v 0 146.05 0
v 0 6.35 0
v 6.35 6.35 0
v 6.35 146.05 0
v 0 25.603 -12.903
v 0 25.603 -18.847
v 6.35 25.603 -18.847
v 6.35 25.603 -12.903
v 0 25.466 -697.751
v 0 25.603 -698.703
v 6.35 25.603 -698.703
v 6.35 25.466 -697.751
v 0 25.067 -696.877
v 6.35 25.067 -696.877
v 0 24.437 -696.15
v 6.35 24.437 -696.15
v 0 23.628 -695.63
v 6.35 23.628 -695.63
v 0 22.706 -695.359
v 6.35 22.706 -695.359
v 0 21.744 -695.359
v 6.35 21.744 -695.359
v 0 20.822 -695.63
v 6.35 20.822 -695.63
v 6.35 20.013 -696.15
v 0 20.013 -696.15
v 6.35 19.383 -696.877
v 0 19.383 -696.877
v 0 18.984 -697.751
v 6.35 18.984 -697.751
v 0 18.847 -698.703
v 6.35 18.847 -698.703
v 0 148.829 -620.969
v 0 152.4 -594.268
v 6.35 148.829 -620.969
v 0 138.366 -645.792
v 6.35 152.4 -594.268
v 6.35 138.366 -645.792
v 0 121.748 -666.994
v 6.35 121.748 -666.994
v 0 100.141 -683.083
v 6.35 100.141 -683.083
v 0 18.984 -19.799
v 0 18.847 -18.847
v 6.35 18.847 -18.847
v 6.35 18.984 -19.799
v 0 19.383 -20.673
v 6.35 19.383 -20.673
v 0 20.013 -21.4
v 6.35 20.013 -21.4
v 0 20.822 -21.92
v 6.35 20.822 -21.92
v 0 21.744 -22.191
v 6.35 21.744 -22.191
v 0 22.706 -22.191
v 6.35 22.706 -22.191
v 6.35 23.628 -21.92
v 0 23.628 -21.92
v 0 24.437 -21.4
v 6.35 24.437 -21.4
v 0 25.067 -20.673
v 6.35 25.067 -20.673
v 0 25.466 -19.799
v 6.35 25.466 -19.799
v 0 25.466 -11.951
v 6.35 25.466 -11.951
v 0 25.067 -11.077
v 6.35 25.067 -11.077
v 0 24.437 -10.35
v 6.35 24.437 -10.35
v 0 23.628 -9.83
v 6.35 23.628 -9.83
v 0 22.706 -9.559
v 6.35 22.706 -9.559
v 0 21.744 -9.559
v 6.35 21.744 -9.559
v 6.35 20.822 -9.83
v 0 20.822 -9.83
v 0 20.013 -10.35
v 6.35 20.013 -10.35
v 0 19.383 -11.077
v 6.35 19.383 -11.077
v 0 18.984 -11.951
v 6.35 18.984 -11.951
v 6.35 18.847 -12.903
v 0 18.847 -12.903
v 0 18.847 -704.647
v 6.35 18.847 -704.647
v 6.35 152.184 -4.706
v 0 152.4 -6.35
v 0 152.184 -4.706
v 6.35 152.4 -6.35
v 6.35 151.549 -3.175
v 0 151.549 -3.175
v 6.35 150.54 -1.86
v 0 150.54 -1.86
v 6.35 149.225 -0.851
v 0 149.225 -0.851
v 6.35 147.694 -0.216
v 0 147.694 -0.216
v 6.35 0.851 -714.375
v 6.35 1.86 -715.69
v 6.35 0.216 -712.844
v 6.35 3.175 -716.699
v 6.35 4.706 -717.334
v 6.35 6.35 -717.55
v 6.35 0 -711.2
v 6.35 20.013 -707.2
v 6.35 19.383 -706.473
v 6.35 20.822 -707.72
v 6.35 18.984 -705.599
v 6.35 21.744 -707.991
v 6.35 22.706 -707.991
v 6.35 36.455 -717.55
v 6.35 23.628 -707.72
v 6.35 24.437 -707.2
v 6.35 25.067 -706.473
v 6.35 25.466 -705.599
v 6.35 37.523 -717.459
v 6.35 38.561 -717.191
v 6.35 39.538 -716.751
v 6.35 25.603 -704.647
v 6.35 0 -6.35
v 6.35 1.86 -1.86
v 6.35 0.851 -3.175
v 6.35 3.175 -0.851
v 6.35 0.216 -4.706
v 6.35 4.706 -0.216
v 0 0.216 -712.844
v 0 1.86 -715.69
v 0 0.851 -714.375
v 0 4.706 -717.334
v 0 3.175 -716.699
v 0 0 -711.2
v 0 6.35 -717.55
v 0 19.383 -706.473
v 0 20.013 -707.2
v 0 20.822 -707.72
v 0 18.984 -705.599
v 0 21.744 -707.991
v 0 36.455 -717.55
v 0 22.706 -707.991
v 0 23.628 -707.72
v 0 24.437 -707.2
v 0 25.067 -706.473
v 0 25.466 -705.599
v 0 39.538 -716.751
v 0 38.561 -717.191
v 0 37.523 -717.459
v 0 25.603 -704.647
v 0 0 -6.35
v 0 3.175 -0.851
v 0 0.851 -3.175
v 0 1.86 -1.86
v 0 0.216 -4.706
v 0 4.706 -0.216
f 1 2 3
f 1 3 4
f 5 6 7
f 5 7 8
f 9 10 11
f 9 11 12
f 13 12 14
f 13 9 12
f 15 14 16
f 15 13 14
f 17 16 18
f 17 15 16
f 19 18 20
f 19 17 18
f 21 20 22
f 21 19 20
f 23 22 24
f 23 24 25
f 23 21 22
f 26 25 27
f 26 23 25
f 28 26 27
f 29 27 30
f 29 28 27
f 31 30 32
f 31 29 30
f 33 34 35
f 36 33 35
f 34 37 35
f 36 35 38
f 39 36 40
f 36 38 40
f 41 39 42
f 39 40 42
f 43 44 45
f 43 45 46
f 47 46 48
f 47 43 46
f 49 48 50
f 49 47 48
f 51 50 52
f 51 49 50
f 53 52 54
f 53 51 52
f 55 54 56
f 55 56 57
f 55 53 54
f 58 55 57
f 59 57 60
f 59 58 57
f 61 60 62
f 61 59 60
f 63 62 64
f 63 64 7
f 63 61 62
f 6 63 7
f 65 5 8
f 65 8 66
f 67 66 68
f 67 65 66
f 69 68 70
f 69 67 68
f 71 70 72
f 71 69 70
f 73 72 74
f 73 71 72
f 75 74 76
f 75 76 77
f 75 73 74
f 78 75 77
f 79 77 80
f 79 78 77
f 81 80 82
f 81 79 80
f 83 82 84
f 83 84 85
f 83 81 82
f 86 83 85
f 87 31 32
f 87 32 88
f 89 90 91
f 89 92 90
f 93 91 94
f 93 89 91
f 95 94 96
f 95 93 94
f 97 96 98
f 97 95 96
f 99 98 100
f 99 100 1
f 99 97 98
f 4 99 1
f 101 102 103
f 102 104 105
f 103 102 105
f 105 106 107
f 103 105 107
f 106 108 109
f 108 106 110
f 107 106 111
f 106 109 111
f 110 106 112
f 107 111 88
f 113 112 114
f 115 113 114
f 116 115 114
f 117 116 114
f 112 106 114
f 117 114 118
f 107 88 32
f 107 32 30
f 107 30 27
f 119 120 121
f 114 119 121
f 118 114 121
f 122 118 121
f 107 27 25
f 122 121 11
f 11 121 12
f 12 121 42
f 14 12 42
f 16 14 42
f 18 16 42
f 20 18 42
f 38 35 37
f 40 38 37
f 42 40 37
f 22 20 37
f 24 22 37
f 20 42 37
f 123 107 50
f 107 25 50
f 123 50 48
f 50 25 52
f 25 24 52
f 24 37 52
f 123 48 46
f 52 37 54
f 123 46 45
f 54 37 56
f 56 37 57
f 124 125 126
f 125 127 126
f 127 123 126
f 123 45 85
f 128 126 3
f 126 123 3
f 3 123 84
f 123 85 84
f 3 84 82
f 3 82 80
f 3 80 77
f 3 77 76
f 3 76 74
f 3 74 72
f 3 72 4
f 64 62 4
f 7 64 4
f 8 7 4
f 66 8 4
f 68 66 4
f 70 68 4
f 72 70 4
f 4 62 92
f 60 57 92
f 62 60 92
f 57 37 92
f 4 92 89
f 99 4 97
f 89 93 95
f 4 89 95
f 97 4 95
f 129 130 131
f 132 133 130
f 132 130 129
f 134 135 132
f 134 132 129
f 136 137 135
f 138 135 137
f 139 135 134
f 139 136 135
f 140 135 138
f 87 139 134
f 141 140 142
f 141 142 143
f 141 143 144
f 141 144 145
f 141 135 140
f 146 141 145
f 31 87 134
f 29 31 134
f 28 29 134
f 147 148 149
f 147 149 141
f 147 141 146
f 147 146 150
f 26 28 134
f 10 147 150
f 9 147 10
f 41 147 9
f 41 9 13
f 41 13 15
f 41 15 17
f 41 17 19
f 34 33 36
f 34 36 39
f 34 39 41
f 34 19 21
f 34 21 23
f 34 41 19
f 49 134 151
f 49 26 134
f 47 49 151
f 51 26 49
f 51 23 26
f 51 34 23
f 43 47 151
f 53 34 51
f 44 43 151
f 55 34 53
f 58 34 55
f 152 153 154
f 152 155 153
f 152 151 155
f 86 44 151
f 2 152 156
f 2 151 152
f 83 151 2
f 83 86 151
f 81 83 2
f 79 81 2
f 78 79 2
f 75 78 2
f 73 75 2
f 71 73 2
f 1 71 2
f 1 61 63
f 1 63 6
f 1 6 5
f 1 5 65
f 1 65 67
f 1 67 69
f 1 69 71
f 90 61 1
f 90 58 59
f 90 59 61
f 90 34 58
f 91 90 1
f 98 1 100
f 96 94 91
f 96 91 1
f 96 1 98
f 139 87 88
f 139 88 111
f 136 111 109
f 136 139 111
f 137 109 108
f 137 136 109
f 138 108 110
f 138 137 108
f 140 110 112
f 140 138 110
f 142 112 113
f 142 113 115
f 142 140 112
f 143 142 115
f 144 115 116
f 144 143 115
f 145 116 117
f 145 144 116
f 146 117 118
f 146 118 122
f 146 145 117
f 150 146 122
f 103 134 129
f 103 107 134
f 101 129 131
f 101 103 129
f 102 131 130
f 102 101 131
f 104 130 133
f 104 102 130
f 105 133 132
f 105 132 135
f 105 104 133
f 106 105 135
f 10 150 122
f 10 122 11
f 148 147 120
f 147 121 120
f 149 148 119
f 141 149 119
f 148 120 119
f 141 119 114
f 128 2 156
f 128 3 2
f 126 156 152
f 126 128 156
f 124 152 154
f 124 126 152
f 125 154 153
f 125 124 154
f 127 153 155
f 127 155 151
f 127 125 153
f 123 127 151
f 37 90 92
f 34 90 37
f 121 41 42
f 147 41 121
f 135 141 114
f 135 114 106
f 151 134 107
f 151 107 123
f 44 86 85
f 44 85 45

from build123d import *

# Parameters (mm, degrees)
BOSS_EXTRUDE1_DEPTH         = 6.35
FILLET1_R                   = 101.6
F_1_4_CLEARANCE_SLOT1_DEPTH = 6.35
FILLET2_R                   = 6.35


# Read off the part's stored shape, not the designer's step: 1/4 Clearance Slot1
with BuildPart() as part:
    # Sketch1 → Boss-Extrude1 (new body)
    with BuildSketch(Plane(origin=(0, 0, 0), x_dir=(0, 0, -1), z_dir=(1, 0, 0))):
        Polygon((0, 0), (0, 152.4), (654.05, 152.4), (717.55, 38.1), (717.55, 0), align=None)
    extrude(amount=BOSS_EXTRUDE1_DEPTH)

    # Fillet1
    fillet1_edges = [part.edges().sort_by_distance(p)[0] for p in [
        (3.175, 152.4, -654.05),
    ]]
    fillet(fillet1_edges, radius=FILLET1_R)

    # 1/4 Clearance Slot1 outline → 1/4 Clearance Slot1 (cut)
    with BuildSketch(Plane.YZ):
        with BuildLine():
            ThreePointArc((25.6032, -698.7032), (22.225, -695.325), (18.8468, -698.7032))
            Line((18.8468, -698.7032), (18.8468, -704.6468))
            ThreePointArc((18.8468, -704.6468), (22.225, -708.025), (25.6032, -704.6468))
            Line((25.6032, -704.6468), (25.6032, -698.7032))
        make_face()
        with BuildLine():
            Line((25.6032, -18.8468), (25.6032, -12.9032))
            ThreePointArc((25.6032, -12.9032), (22.225, -9.525), (18.8468, -12.9032))
            Line((18.8468, -12.9032), (18.8468, -18.8468))
            ThreePointArc((18.8468, -18.8468), (22.225, -22.225), (25.6032, -18.8468))
        make_face()
    extrude(amount=F_1_4_CLEARANCE_SLOT1_DEPTH, mode=Mode.SUBTRACT)

    # Fillet2
    fillet2_edges = [part.edges().sort_by_distance(p)[0] for p in [
        (3.175, 0, 0),
        (3.175, 152.4, 0),
        (3.175, 38.1, -717.55),
        (3.175, 0, -717.55),
    ]]
    fillet(fillet2_edges, radius=FILLET2_R)


solid = part.part
